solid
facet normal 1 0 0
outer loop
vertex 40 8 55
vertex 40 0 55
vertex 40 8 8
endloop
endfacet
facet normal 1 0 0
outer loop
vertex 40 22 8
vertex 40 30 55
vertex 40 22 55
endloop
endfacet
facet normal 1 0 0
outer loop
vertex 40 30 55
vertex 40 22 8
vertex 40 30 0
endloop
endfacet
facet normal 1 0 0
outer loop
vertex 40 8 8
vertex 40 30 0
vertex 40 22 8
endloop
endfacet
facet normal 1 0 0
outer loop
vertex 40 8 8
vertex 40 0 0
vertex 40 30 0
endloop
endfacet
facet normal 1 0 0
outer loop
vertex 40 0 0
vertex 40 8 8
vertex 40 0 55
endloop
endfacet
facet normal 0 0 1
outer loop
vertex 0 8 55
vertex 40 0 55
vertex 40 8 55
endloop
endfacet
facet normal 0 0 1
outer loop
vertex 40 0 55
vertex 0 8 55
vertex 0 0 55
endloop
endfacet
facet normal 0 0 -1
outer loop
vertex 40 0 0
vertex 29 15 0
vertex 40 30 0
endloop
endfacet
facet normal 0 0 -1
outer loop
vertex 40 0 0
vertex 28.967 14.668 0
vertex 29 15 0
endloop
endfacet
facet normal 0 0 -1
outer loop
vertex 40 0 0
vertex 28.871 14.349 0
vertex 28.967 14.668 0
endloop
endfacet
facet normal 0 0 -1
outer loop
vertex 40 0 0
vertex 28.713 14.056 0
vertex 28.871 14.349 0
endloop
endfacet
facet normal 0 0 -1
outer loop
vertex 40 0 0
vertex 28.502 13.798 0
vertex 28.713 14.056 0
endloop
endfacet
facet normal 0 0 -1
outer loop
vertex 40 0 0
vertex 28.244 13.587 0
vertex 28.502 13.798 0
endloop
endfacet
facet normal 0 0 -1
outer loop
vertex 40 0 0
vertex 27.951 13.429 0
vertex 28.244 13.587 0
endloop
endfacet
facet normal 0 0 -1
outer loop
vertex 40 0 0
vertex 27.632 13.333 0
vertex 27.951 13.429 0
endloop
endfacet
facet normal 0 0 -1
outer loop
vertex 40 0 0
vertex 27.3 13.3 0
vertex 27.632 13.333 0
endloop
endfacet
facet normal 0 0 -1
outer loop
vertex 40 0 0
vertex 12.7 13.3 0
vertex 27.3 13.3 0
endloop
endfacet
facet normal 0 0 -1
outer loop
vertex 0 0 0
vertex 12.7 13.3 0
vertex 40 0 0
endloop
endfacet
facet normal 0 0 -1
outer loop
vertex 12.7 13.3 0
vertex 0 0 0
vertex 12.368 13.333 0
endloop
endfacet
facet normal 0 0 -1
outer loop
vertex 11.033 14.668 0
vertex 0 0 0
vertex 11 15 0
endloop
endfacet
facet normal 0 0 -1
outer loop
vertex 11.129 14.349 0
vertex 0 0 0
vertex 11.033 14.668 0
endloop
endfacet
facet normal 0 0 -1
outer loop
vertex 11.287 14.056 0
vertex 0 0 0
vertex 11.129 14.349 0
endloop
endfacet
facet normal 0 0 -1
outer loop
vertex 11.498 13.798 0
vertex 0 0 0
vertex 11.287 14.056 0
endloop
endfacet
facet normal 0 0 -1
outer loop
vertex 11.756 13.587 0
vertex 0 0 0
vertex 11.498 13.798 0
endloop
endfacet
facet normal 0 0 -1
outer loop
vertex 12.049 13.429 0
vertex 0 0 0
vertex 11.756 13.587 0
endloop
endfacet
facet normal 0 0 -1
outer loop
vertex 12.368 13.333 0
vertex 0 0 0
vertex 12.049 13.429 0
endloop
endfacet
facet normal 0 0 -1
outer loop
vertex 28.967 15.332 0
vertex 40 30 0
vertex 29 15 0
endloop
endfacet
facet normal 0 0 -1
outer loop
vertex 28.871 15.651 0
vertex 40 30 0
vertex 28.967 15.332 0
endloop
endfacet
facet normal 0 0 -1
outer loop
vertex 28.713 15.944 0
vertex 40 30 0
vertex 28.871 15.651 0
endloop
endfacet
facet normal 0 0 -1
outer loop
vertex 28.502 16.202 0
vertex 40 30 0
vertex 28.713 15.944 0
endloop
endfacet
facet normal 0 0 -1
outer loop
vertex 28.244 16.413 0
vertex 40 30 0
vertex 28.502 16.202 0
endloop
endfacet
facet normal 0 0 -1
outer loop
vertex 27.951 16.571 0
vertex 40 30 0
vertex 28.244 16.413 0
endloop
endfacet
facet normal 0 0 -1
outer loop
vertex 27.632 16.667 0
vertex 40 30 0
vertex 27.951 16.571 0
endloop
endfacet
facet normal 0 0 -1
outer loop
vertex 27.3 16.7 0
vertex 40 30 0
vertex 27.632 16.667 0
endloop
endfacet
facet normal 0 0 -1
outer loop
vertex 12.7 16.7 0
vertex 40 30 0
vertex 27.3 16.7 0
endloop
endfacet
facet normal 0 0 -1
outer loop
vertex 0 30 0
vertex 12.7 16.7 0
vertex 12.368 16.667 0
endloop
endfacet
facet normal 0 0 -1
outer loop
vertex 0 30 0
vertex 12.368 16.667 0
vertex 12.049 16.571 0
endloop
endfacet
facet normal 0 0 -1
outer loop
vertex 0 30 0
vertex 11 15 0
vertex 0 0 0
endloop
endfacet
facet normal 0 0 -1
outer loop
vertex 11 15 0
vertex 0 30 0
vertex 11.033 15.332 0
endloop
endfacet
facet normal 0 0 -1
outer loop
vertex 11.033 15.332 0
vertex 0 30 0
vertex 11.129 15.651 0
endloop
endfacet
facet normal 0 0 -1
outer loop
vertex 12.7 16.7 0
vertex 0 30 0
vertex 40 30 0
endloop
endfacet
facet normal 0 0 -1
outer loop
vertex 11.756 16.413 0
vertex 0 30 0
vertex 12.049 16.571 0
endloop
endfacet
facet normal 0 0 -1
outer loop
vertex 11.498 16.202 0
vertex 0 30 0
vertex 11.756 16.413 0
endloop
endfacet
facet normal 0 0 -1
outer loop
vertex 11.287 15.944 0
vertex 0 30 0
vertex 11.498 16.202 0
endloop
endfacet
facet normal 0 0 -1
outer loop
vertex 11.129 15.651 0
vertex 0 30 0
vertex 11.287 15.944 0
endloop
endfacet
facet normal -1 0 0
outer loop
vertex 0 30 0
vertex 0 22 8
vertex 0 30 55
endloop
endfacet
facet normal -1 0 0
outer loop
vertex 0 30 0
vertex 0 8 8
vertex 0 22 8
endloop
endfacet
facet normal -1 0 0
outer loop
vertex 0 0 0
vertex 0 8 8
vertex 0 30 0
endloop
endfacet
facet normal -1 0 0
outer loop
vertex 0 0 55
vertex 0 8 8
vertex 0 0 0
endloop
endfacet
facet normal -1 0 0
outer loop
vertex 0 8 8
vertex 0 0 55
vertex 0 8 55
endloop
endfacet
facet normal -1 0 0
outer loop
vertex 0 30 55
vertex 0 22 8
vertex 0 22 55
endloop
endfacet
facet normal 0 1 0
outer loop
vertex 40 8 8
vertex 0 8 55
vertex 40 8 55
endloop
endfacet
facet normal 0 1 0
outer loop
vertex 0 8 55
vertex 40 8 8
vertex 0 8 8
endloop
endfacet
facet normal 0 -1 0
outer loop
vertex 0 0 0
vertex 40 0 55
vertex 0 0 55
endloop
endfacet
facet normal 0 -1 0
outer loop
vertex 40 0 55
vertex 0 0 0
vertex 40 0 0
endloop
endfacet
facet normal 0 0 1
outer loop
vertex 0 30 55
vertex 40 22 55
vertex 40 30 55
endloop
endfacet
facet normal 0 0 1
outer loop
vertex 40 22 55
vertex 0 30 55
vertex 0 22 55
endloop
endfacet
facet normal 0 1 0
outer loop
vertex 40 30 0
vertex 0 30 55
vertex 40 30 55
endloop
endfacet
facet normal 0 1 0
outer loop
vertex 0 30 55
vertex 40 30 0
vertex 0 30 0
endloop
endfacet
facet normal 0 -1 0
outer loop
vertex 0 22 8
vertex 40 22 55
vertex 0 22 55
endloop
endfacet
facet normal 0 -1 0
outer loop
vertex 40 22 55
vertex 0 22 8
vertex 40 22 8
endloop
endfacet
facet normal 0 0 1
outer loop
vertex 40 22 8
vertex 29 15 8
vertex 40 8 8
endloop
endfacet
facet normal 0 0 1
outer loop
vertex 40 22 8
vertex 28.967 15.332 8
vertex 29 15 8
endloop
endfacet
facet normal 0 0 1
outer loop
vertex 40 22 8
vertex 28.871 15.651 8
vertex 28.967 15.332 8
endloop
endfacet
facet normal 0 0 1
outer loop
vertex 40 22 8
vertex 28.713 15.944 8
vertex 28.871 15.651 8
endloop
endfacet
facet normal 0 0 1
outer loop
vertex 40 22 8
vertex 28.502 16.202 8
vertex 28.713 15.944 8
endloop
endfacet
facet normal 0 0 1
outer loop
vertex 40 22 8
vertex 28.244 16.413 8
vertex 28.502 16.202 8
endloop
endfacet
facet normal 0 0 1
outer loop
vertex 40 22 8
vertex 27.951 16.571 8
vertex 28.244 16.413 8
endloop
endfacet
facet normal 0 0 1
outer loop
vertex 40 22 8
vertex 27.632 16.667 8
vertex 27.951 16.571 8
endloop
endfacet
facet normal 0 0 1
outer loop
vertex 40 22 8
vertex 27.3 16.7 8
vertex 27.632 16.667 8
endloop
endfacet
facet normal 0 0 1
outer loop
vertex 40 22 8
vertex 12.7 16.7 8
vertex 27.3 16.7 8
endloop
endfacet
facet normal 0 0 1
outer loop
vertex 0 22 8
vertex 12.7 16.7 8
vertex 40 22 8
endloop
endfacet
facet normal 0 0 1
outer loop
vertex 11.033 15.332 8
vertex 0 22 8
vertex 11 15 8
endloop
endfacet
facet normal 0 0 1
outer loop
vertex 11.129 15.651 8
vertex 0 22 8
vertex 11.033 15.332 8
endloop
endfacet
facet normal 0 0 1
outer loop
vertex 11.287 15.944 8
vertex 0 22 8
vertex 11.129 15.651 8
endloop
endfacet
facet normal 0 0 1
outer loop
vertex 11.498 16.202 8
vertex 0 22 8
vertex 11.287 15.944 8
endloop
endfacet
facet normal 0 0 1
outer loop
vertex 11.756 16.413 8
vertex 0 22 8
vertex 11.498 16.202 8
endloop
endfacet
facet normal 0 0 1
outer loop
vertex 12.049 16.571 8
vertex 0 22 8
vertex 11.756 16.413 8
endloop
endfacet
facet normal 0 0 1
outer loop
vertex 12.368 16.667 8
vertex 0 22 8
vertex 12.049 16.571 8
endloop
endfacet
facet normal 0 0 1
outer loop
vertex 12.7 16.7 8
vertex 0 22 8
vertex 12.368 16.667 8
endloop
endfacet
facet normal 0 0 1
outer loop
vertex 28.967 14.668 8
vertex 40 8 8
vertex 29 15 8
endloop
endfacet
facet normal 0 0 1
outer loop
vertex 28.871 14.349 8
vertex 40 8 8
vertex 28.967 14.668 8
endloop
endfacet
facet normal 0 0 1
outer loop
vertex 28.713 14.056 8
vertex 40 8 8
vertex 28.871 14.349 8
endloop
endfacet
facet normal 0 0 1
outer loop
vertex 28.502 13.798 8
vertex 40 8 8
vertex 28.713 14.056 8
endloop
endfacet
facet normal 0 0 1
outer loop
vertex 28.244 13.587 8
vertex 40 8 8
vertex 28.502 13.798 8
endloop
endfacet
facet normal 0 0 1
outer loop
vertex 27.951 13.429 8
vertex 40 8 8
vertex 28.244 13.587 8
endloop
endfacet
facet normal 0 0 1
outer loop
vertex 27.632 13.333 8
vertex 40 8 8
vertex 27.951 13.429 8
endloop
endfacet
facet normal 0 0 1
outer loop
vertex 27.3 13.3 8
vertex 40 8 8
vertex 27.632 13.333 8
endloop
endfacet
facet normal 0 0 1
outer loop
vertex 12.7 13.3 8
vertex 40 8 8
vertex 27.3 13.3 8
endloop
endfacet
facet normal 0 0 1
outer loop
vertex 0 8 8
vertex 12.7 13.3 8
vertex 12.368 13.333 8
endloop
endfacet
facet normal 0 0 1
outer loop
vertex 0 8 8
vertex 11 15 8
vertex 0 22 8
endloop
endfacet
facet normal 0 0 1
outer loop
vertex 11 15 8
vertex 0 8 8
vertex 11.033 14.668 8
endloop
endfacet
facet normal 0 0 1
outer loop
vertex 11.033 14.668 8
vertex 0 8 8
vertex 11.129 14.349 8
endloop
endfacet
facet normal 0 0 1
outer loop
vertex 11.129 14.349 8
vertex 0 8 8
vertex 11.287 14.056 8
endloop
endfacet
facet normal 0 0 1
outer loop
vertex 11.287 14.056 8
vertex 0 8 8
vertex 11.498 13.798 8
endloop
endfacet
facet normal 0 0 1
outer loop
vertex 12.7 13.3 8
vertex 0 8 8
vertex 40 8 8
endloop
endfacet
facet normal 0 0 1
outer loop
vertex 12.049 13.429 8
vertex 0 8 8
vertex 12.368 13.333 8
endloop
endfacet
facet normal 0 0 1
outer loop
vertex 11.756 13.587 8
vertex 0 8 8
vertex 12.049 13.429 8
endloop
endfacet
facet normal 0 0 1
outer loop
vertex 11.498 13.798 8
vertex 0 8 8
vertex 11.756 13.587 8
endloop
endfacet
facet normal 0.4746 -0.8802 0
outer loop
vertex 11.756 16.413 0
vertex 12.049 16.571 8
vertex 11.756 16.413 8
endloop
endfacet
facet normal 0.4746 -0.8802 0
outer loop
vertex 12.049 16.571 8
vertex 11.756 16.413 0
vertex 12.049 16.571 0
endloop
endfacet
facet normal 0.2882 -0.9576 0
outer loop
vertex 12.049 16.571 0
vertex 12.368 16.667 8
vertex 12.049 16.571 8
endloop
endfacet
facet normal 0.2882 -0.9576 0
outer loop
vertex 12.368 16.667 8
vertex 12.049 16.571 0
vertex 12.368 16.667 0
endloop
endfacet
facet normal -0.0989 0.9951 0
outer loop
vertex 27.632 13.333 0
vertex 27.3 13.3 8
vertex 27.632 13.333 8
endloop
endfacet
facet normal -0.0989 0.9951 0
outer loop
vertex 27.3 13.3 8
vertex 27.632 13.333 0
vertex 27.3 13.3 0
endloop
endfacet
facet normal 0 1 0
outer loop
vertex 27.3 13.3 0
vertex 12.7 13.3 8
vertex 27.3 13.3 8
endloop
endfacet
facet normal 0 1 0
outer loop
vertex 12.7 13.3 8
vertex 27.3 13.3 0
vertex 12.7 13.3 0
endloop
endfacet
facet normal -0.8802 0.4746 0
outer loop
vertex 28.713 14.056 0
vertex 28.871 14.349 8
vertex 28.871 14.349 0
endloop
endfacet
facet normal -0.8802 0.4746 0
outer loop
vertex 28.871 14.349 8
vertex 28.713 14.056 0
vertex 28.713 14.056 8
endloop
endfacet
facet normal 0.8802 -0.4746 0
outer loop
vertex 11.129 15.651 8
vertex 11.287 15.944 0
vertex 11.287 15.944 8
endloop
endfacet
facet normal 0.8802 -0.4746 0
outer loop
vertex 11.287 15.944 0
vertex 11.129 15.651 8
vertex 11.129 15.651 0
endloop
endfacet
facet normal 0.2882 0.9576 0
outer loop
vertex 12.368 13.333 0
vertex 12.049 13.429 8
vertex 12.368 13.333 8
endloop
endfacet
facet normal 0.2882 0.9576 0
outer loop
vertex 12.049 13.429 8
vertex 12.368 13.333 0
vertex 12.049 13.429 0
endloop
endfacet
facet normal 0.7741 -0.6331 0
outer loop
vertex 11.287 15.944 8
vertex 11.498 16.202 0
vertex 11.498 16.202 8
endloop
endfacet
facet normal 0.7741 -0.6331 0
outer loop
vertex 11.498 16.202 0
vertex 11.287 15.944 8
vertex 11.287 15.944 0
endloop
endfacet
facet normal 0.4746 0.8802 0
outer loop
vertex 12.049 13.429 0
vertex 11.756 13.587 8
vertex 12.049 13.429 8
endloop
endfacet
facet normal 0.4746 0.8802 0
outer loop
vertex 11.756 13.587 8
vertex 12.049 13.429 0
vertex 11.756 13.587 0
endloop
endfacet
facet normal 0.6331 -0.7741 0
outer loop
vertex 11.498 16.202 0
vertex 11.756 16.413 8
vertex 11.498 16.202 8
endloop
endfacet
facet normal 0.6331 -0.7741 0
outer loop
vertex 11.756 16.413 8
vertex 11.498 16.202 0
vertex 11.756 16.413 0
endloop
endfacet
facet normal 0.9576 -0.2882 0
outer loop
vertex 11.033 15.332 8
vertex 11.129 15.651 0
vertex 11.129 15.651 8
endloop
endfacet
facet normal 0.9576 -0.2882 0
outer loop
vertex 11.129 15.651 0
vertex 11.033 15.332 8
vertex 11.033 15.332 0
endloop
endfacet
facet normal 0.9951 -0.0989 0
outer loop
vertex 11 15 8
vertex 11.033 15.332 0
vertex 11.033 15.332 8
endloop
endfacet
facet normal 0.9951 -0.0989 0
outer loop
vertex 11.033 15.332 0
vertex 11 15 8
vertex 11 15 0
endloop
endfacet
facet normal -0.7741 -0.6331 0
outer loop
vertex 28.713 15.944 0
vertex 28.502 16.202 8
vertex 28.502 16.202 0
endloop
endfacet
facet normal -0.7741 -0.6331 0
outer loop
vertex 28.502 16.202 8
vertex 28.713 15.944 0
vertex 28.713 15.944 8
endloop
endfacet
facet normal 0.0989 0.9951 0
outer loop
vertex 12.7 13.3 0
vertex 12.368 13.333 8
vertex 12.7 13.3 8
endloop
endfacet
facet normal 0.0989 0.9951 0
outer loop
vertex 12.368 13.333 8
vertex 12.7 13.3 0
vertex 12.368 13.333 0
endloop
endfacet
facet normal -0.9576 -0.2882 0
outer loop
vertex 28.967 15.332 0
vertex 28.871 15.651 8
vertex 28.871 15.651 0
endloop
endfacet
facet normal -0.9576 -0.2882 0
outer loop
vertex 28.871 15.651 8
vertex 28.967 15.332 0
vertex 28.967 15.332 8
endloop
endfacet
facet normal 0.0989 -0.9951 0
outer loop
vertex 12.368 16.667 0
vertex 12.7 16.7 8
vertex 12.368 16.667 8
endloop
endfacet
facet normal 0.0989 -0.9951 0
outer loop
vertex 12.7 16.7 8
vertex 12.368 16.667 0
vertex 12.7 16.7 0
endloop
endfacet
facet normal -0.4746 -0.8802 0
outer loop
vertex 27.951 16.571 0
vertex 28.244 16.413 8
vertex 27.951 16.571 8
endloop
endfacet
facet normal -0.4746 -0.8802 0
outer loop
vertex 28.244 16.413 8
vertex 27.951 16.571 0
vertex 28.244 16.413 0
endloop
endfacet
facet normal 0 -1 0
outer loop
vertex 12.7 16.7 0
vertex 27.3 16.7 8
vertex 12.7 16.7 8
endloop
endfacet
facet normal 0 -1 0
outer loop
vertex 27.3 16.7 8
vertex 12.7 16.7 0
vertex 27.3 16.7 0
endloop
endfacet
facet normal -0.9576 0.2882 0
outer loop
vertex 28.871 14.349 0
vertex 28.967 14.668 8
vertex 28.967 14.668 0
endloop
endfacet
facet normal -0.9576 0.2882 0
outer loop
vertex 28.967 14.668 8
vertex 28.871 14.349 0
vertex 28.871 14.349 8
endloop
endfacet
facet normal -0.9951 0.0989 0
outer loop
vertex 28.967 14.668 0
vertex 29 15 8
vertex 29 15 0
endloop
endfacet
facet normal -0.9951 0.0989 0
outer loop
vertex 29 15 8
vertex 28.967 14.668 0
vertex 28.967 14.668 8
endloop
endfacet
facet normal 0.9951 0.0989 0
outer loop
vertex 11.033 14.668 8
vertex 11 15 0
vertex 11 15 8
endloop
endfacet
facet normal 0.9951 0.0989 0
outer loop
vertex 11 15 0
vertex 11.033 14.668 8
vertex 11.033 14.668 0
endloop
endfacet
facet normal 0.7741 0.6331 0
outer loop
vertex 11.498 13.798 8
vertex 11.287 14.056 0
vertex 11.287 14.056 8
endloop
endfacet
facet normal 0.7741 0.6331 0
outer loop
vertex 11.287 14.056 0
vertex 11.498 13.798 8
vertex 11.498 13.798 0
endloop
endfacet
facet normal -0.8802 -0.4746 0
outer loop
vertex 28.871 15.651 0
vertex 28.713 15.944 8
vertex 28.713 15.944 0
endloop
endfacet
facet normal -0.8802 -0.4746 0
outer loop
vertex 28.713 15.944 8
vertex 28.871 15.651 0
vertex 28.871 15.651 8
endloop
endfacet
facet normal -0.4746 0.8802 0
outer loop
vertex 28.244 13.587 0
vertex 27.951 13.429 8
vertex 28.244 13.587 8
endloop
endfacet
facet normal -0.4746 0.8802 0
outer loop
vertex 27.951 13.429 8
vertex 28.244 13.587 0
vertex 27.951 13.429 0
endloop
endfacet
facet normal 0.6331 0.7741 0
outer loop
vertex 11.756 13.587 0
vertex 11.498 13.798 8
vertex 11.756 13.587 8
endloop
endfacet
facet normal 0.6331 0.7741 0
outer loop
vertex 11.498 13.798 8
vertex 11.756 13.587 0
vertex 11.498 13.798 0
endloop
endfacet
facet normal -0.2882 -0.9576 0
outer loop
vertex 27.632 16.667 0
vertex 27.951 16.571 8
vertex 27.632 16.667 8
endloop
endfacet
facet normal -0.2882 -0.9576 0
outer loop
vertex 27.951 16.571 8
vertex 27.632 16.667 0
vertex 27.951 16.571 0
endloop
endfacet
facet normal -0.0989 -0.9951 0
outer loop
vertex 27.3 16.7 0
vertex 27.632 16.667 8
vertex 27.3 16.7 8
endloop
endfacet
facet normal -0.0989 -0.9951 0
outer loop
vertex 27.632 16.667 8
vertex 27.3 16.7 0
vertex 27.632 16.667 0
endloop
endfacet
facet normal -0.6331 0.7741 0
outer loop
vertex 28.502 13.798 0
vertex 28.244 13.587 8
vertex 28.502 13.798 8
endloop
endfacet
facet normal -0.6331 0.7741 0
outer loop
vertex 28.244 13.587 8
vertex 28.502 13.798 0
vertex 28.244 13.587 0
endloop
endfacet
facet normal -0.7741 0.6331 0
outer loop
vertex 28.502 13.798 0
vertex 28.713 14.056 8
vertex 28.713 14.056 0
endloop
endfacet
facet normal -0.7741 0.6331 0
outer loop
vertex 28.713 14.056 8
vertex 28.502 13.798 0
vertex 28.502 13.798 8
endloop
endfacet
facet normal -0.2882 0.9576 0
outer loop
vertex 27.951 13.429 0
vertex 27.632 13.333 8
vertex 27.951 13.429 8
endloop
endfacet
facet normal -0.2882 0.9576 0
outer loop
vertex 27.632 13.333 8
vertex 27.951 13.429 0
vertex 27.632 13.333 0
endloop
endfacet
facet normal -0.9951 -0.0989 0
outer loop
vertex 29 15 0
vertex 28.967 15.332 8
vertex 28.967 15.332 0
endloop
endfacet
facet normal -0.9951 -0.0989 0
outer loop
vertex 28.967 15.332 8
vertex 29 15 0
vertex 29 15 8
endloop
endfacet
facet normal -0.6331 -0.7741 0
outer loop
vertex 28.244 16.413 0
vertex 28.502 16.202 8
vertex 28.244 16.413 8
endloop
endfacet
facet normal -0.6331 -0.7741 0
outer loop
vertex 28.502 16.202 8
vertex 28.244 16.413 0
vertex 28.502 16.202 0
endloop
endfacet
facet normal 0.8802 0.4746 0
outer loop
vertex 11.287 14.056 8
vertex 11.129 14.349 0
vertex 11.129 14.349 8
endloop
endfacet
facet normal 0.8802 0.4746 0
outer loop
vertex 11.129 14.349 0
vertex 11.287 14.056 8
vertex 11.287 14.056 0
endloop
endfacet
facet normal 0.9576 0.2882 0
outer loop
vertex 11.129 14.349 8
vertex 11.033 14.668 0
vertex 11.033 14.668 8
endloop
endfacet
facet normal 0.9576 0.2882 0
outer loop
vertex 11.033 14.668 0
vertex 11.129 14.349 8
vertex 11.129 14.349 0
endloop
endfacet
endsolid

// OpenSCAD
$fn = 32;

// ----------------------------------------------------------------------
// U-bracket: 40 x 30 x 55 mm
// ----------------------------------------------------------------------

// --- parameters (mm) ---
length = 40;              // outer length, X
width = 30;               // outer width, Y
height = 55;              // upright height, Z
thick = 8;                // wall thickness
hole_d = 3.4;             // clearance for M3
slot_l = 18;              // slot length

module hole_z(px, py) {
  translate([px, py, -0.5]) cylinder(h = thick + 1, d = hole_d);
}
module hole_y_pz(pz) {
  /* through both uprights along Y */
  translate([0, -0.5, pz]) rotate([-90, 0, 0]) cylinder(h = width + 1, d = hole_d);
}
module slot_z(px, py) {
  hull() {
    translate([px - (slot_l - hole_d) / 2, py, -0.5]) cylinder(h = thick + 1, d = hole_d);
    translate([px + (slot_l - hole_d) / 2, py, -0.5]) cylinder(h = thick + 1, d = hole_d);
  }
}

module base() {
  cube([length, width, thick]);
}

module uprights() {
  cube([length, thick, height]);
  translate([0, width - thick, 0]) cube([length, thick, height]);
}

difference() {
  union() {
    base();
    uprights();
  }
  slot_z(20, 15);
}
